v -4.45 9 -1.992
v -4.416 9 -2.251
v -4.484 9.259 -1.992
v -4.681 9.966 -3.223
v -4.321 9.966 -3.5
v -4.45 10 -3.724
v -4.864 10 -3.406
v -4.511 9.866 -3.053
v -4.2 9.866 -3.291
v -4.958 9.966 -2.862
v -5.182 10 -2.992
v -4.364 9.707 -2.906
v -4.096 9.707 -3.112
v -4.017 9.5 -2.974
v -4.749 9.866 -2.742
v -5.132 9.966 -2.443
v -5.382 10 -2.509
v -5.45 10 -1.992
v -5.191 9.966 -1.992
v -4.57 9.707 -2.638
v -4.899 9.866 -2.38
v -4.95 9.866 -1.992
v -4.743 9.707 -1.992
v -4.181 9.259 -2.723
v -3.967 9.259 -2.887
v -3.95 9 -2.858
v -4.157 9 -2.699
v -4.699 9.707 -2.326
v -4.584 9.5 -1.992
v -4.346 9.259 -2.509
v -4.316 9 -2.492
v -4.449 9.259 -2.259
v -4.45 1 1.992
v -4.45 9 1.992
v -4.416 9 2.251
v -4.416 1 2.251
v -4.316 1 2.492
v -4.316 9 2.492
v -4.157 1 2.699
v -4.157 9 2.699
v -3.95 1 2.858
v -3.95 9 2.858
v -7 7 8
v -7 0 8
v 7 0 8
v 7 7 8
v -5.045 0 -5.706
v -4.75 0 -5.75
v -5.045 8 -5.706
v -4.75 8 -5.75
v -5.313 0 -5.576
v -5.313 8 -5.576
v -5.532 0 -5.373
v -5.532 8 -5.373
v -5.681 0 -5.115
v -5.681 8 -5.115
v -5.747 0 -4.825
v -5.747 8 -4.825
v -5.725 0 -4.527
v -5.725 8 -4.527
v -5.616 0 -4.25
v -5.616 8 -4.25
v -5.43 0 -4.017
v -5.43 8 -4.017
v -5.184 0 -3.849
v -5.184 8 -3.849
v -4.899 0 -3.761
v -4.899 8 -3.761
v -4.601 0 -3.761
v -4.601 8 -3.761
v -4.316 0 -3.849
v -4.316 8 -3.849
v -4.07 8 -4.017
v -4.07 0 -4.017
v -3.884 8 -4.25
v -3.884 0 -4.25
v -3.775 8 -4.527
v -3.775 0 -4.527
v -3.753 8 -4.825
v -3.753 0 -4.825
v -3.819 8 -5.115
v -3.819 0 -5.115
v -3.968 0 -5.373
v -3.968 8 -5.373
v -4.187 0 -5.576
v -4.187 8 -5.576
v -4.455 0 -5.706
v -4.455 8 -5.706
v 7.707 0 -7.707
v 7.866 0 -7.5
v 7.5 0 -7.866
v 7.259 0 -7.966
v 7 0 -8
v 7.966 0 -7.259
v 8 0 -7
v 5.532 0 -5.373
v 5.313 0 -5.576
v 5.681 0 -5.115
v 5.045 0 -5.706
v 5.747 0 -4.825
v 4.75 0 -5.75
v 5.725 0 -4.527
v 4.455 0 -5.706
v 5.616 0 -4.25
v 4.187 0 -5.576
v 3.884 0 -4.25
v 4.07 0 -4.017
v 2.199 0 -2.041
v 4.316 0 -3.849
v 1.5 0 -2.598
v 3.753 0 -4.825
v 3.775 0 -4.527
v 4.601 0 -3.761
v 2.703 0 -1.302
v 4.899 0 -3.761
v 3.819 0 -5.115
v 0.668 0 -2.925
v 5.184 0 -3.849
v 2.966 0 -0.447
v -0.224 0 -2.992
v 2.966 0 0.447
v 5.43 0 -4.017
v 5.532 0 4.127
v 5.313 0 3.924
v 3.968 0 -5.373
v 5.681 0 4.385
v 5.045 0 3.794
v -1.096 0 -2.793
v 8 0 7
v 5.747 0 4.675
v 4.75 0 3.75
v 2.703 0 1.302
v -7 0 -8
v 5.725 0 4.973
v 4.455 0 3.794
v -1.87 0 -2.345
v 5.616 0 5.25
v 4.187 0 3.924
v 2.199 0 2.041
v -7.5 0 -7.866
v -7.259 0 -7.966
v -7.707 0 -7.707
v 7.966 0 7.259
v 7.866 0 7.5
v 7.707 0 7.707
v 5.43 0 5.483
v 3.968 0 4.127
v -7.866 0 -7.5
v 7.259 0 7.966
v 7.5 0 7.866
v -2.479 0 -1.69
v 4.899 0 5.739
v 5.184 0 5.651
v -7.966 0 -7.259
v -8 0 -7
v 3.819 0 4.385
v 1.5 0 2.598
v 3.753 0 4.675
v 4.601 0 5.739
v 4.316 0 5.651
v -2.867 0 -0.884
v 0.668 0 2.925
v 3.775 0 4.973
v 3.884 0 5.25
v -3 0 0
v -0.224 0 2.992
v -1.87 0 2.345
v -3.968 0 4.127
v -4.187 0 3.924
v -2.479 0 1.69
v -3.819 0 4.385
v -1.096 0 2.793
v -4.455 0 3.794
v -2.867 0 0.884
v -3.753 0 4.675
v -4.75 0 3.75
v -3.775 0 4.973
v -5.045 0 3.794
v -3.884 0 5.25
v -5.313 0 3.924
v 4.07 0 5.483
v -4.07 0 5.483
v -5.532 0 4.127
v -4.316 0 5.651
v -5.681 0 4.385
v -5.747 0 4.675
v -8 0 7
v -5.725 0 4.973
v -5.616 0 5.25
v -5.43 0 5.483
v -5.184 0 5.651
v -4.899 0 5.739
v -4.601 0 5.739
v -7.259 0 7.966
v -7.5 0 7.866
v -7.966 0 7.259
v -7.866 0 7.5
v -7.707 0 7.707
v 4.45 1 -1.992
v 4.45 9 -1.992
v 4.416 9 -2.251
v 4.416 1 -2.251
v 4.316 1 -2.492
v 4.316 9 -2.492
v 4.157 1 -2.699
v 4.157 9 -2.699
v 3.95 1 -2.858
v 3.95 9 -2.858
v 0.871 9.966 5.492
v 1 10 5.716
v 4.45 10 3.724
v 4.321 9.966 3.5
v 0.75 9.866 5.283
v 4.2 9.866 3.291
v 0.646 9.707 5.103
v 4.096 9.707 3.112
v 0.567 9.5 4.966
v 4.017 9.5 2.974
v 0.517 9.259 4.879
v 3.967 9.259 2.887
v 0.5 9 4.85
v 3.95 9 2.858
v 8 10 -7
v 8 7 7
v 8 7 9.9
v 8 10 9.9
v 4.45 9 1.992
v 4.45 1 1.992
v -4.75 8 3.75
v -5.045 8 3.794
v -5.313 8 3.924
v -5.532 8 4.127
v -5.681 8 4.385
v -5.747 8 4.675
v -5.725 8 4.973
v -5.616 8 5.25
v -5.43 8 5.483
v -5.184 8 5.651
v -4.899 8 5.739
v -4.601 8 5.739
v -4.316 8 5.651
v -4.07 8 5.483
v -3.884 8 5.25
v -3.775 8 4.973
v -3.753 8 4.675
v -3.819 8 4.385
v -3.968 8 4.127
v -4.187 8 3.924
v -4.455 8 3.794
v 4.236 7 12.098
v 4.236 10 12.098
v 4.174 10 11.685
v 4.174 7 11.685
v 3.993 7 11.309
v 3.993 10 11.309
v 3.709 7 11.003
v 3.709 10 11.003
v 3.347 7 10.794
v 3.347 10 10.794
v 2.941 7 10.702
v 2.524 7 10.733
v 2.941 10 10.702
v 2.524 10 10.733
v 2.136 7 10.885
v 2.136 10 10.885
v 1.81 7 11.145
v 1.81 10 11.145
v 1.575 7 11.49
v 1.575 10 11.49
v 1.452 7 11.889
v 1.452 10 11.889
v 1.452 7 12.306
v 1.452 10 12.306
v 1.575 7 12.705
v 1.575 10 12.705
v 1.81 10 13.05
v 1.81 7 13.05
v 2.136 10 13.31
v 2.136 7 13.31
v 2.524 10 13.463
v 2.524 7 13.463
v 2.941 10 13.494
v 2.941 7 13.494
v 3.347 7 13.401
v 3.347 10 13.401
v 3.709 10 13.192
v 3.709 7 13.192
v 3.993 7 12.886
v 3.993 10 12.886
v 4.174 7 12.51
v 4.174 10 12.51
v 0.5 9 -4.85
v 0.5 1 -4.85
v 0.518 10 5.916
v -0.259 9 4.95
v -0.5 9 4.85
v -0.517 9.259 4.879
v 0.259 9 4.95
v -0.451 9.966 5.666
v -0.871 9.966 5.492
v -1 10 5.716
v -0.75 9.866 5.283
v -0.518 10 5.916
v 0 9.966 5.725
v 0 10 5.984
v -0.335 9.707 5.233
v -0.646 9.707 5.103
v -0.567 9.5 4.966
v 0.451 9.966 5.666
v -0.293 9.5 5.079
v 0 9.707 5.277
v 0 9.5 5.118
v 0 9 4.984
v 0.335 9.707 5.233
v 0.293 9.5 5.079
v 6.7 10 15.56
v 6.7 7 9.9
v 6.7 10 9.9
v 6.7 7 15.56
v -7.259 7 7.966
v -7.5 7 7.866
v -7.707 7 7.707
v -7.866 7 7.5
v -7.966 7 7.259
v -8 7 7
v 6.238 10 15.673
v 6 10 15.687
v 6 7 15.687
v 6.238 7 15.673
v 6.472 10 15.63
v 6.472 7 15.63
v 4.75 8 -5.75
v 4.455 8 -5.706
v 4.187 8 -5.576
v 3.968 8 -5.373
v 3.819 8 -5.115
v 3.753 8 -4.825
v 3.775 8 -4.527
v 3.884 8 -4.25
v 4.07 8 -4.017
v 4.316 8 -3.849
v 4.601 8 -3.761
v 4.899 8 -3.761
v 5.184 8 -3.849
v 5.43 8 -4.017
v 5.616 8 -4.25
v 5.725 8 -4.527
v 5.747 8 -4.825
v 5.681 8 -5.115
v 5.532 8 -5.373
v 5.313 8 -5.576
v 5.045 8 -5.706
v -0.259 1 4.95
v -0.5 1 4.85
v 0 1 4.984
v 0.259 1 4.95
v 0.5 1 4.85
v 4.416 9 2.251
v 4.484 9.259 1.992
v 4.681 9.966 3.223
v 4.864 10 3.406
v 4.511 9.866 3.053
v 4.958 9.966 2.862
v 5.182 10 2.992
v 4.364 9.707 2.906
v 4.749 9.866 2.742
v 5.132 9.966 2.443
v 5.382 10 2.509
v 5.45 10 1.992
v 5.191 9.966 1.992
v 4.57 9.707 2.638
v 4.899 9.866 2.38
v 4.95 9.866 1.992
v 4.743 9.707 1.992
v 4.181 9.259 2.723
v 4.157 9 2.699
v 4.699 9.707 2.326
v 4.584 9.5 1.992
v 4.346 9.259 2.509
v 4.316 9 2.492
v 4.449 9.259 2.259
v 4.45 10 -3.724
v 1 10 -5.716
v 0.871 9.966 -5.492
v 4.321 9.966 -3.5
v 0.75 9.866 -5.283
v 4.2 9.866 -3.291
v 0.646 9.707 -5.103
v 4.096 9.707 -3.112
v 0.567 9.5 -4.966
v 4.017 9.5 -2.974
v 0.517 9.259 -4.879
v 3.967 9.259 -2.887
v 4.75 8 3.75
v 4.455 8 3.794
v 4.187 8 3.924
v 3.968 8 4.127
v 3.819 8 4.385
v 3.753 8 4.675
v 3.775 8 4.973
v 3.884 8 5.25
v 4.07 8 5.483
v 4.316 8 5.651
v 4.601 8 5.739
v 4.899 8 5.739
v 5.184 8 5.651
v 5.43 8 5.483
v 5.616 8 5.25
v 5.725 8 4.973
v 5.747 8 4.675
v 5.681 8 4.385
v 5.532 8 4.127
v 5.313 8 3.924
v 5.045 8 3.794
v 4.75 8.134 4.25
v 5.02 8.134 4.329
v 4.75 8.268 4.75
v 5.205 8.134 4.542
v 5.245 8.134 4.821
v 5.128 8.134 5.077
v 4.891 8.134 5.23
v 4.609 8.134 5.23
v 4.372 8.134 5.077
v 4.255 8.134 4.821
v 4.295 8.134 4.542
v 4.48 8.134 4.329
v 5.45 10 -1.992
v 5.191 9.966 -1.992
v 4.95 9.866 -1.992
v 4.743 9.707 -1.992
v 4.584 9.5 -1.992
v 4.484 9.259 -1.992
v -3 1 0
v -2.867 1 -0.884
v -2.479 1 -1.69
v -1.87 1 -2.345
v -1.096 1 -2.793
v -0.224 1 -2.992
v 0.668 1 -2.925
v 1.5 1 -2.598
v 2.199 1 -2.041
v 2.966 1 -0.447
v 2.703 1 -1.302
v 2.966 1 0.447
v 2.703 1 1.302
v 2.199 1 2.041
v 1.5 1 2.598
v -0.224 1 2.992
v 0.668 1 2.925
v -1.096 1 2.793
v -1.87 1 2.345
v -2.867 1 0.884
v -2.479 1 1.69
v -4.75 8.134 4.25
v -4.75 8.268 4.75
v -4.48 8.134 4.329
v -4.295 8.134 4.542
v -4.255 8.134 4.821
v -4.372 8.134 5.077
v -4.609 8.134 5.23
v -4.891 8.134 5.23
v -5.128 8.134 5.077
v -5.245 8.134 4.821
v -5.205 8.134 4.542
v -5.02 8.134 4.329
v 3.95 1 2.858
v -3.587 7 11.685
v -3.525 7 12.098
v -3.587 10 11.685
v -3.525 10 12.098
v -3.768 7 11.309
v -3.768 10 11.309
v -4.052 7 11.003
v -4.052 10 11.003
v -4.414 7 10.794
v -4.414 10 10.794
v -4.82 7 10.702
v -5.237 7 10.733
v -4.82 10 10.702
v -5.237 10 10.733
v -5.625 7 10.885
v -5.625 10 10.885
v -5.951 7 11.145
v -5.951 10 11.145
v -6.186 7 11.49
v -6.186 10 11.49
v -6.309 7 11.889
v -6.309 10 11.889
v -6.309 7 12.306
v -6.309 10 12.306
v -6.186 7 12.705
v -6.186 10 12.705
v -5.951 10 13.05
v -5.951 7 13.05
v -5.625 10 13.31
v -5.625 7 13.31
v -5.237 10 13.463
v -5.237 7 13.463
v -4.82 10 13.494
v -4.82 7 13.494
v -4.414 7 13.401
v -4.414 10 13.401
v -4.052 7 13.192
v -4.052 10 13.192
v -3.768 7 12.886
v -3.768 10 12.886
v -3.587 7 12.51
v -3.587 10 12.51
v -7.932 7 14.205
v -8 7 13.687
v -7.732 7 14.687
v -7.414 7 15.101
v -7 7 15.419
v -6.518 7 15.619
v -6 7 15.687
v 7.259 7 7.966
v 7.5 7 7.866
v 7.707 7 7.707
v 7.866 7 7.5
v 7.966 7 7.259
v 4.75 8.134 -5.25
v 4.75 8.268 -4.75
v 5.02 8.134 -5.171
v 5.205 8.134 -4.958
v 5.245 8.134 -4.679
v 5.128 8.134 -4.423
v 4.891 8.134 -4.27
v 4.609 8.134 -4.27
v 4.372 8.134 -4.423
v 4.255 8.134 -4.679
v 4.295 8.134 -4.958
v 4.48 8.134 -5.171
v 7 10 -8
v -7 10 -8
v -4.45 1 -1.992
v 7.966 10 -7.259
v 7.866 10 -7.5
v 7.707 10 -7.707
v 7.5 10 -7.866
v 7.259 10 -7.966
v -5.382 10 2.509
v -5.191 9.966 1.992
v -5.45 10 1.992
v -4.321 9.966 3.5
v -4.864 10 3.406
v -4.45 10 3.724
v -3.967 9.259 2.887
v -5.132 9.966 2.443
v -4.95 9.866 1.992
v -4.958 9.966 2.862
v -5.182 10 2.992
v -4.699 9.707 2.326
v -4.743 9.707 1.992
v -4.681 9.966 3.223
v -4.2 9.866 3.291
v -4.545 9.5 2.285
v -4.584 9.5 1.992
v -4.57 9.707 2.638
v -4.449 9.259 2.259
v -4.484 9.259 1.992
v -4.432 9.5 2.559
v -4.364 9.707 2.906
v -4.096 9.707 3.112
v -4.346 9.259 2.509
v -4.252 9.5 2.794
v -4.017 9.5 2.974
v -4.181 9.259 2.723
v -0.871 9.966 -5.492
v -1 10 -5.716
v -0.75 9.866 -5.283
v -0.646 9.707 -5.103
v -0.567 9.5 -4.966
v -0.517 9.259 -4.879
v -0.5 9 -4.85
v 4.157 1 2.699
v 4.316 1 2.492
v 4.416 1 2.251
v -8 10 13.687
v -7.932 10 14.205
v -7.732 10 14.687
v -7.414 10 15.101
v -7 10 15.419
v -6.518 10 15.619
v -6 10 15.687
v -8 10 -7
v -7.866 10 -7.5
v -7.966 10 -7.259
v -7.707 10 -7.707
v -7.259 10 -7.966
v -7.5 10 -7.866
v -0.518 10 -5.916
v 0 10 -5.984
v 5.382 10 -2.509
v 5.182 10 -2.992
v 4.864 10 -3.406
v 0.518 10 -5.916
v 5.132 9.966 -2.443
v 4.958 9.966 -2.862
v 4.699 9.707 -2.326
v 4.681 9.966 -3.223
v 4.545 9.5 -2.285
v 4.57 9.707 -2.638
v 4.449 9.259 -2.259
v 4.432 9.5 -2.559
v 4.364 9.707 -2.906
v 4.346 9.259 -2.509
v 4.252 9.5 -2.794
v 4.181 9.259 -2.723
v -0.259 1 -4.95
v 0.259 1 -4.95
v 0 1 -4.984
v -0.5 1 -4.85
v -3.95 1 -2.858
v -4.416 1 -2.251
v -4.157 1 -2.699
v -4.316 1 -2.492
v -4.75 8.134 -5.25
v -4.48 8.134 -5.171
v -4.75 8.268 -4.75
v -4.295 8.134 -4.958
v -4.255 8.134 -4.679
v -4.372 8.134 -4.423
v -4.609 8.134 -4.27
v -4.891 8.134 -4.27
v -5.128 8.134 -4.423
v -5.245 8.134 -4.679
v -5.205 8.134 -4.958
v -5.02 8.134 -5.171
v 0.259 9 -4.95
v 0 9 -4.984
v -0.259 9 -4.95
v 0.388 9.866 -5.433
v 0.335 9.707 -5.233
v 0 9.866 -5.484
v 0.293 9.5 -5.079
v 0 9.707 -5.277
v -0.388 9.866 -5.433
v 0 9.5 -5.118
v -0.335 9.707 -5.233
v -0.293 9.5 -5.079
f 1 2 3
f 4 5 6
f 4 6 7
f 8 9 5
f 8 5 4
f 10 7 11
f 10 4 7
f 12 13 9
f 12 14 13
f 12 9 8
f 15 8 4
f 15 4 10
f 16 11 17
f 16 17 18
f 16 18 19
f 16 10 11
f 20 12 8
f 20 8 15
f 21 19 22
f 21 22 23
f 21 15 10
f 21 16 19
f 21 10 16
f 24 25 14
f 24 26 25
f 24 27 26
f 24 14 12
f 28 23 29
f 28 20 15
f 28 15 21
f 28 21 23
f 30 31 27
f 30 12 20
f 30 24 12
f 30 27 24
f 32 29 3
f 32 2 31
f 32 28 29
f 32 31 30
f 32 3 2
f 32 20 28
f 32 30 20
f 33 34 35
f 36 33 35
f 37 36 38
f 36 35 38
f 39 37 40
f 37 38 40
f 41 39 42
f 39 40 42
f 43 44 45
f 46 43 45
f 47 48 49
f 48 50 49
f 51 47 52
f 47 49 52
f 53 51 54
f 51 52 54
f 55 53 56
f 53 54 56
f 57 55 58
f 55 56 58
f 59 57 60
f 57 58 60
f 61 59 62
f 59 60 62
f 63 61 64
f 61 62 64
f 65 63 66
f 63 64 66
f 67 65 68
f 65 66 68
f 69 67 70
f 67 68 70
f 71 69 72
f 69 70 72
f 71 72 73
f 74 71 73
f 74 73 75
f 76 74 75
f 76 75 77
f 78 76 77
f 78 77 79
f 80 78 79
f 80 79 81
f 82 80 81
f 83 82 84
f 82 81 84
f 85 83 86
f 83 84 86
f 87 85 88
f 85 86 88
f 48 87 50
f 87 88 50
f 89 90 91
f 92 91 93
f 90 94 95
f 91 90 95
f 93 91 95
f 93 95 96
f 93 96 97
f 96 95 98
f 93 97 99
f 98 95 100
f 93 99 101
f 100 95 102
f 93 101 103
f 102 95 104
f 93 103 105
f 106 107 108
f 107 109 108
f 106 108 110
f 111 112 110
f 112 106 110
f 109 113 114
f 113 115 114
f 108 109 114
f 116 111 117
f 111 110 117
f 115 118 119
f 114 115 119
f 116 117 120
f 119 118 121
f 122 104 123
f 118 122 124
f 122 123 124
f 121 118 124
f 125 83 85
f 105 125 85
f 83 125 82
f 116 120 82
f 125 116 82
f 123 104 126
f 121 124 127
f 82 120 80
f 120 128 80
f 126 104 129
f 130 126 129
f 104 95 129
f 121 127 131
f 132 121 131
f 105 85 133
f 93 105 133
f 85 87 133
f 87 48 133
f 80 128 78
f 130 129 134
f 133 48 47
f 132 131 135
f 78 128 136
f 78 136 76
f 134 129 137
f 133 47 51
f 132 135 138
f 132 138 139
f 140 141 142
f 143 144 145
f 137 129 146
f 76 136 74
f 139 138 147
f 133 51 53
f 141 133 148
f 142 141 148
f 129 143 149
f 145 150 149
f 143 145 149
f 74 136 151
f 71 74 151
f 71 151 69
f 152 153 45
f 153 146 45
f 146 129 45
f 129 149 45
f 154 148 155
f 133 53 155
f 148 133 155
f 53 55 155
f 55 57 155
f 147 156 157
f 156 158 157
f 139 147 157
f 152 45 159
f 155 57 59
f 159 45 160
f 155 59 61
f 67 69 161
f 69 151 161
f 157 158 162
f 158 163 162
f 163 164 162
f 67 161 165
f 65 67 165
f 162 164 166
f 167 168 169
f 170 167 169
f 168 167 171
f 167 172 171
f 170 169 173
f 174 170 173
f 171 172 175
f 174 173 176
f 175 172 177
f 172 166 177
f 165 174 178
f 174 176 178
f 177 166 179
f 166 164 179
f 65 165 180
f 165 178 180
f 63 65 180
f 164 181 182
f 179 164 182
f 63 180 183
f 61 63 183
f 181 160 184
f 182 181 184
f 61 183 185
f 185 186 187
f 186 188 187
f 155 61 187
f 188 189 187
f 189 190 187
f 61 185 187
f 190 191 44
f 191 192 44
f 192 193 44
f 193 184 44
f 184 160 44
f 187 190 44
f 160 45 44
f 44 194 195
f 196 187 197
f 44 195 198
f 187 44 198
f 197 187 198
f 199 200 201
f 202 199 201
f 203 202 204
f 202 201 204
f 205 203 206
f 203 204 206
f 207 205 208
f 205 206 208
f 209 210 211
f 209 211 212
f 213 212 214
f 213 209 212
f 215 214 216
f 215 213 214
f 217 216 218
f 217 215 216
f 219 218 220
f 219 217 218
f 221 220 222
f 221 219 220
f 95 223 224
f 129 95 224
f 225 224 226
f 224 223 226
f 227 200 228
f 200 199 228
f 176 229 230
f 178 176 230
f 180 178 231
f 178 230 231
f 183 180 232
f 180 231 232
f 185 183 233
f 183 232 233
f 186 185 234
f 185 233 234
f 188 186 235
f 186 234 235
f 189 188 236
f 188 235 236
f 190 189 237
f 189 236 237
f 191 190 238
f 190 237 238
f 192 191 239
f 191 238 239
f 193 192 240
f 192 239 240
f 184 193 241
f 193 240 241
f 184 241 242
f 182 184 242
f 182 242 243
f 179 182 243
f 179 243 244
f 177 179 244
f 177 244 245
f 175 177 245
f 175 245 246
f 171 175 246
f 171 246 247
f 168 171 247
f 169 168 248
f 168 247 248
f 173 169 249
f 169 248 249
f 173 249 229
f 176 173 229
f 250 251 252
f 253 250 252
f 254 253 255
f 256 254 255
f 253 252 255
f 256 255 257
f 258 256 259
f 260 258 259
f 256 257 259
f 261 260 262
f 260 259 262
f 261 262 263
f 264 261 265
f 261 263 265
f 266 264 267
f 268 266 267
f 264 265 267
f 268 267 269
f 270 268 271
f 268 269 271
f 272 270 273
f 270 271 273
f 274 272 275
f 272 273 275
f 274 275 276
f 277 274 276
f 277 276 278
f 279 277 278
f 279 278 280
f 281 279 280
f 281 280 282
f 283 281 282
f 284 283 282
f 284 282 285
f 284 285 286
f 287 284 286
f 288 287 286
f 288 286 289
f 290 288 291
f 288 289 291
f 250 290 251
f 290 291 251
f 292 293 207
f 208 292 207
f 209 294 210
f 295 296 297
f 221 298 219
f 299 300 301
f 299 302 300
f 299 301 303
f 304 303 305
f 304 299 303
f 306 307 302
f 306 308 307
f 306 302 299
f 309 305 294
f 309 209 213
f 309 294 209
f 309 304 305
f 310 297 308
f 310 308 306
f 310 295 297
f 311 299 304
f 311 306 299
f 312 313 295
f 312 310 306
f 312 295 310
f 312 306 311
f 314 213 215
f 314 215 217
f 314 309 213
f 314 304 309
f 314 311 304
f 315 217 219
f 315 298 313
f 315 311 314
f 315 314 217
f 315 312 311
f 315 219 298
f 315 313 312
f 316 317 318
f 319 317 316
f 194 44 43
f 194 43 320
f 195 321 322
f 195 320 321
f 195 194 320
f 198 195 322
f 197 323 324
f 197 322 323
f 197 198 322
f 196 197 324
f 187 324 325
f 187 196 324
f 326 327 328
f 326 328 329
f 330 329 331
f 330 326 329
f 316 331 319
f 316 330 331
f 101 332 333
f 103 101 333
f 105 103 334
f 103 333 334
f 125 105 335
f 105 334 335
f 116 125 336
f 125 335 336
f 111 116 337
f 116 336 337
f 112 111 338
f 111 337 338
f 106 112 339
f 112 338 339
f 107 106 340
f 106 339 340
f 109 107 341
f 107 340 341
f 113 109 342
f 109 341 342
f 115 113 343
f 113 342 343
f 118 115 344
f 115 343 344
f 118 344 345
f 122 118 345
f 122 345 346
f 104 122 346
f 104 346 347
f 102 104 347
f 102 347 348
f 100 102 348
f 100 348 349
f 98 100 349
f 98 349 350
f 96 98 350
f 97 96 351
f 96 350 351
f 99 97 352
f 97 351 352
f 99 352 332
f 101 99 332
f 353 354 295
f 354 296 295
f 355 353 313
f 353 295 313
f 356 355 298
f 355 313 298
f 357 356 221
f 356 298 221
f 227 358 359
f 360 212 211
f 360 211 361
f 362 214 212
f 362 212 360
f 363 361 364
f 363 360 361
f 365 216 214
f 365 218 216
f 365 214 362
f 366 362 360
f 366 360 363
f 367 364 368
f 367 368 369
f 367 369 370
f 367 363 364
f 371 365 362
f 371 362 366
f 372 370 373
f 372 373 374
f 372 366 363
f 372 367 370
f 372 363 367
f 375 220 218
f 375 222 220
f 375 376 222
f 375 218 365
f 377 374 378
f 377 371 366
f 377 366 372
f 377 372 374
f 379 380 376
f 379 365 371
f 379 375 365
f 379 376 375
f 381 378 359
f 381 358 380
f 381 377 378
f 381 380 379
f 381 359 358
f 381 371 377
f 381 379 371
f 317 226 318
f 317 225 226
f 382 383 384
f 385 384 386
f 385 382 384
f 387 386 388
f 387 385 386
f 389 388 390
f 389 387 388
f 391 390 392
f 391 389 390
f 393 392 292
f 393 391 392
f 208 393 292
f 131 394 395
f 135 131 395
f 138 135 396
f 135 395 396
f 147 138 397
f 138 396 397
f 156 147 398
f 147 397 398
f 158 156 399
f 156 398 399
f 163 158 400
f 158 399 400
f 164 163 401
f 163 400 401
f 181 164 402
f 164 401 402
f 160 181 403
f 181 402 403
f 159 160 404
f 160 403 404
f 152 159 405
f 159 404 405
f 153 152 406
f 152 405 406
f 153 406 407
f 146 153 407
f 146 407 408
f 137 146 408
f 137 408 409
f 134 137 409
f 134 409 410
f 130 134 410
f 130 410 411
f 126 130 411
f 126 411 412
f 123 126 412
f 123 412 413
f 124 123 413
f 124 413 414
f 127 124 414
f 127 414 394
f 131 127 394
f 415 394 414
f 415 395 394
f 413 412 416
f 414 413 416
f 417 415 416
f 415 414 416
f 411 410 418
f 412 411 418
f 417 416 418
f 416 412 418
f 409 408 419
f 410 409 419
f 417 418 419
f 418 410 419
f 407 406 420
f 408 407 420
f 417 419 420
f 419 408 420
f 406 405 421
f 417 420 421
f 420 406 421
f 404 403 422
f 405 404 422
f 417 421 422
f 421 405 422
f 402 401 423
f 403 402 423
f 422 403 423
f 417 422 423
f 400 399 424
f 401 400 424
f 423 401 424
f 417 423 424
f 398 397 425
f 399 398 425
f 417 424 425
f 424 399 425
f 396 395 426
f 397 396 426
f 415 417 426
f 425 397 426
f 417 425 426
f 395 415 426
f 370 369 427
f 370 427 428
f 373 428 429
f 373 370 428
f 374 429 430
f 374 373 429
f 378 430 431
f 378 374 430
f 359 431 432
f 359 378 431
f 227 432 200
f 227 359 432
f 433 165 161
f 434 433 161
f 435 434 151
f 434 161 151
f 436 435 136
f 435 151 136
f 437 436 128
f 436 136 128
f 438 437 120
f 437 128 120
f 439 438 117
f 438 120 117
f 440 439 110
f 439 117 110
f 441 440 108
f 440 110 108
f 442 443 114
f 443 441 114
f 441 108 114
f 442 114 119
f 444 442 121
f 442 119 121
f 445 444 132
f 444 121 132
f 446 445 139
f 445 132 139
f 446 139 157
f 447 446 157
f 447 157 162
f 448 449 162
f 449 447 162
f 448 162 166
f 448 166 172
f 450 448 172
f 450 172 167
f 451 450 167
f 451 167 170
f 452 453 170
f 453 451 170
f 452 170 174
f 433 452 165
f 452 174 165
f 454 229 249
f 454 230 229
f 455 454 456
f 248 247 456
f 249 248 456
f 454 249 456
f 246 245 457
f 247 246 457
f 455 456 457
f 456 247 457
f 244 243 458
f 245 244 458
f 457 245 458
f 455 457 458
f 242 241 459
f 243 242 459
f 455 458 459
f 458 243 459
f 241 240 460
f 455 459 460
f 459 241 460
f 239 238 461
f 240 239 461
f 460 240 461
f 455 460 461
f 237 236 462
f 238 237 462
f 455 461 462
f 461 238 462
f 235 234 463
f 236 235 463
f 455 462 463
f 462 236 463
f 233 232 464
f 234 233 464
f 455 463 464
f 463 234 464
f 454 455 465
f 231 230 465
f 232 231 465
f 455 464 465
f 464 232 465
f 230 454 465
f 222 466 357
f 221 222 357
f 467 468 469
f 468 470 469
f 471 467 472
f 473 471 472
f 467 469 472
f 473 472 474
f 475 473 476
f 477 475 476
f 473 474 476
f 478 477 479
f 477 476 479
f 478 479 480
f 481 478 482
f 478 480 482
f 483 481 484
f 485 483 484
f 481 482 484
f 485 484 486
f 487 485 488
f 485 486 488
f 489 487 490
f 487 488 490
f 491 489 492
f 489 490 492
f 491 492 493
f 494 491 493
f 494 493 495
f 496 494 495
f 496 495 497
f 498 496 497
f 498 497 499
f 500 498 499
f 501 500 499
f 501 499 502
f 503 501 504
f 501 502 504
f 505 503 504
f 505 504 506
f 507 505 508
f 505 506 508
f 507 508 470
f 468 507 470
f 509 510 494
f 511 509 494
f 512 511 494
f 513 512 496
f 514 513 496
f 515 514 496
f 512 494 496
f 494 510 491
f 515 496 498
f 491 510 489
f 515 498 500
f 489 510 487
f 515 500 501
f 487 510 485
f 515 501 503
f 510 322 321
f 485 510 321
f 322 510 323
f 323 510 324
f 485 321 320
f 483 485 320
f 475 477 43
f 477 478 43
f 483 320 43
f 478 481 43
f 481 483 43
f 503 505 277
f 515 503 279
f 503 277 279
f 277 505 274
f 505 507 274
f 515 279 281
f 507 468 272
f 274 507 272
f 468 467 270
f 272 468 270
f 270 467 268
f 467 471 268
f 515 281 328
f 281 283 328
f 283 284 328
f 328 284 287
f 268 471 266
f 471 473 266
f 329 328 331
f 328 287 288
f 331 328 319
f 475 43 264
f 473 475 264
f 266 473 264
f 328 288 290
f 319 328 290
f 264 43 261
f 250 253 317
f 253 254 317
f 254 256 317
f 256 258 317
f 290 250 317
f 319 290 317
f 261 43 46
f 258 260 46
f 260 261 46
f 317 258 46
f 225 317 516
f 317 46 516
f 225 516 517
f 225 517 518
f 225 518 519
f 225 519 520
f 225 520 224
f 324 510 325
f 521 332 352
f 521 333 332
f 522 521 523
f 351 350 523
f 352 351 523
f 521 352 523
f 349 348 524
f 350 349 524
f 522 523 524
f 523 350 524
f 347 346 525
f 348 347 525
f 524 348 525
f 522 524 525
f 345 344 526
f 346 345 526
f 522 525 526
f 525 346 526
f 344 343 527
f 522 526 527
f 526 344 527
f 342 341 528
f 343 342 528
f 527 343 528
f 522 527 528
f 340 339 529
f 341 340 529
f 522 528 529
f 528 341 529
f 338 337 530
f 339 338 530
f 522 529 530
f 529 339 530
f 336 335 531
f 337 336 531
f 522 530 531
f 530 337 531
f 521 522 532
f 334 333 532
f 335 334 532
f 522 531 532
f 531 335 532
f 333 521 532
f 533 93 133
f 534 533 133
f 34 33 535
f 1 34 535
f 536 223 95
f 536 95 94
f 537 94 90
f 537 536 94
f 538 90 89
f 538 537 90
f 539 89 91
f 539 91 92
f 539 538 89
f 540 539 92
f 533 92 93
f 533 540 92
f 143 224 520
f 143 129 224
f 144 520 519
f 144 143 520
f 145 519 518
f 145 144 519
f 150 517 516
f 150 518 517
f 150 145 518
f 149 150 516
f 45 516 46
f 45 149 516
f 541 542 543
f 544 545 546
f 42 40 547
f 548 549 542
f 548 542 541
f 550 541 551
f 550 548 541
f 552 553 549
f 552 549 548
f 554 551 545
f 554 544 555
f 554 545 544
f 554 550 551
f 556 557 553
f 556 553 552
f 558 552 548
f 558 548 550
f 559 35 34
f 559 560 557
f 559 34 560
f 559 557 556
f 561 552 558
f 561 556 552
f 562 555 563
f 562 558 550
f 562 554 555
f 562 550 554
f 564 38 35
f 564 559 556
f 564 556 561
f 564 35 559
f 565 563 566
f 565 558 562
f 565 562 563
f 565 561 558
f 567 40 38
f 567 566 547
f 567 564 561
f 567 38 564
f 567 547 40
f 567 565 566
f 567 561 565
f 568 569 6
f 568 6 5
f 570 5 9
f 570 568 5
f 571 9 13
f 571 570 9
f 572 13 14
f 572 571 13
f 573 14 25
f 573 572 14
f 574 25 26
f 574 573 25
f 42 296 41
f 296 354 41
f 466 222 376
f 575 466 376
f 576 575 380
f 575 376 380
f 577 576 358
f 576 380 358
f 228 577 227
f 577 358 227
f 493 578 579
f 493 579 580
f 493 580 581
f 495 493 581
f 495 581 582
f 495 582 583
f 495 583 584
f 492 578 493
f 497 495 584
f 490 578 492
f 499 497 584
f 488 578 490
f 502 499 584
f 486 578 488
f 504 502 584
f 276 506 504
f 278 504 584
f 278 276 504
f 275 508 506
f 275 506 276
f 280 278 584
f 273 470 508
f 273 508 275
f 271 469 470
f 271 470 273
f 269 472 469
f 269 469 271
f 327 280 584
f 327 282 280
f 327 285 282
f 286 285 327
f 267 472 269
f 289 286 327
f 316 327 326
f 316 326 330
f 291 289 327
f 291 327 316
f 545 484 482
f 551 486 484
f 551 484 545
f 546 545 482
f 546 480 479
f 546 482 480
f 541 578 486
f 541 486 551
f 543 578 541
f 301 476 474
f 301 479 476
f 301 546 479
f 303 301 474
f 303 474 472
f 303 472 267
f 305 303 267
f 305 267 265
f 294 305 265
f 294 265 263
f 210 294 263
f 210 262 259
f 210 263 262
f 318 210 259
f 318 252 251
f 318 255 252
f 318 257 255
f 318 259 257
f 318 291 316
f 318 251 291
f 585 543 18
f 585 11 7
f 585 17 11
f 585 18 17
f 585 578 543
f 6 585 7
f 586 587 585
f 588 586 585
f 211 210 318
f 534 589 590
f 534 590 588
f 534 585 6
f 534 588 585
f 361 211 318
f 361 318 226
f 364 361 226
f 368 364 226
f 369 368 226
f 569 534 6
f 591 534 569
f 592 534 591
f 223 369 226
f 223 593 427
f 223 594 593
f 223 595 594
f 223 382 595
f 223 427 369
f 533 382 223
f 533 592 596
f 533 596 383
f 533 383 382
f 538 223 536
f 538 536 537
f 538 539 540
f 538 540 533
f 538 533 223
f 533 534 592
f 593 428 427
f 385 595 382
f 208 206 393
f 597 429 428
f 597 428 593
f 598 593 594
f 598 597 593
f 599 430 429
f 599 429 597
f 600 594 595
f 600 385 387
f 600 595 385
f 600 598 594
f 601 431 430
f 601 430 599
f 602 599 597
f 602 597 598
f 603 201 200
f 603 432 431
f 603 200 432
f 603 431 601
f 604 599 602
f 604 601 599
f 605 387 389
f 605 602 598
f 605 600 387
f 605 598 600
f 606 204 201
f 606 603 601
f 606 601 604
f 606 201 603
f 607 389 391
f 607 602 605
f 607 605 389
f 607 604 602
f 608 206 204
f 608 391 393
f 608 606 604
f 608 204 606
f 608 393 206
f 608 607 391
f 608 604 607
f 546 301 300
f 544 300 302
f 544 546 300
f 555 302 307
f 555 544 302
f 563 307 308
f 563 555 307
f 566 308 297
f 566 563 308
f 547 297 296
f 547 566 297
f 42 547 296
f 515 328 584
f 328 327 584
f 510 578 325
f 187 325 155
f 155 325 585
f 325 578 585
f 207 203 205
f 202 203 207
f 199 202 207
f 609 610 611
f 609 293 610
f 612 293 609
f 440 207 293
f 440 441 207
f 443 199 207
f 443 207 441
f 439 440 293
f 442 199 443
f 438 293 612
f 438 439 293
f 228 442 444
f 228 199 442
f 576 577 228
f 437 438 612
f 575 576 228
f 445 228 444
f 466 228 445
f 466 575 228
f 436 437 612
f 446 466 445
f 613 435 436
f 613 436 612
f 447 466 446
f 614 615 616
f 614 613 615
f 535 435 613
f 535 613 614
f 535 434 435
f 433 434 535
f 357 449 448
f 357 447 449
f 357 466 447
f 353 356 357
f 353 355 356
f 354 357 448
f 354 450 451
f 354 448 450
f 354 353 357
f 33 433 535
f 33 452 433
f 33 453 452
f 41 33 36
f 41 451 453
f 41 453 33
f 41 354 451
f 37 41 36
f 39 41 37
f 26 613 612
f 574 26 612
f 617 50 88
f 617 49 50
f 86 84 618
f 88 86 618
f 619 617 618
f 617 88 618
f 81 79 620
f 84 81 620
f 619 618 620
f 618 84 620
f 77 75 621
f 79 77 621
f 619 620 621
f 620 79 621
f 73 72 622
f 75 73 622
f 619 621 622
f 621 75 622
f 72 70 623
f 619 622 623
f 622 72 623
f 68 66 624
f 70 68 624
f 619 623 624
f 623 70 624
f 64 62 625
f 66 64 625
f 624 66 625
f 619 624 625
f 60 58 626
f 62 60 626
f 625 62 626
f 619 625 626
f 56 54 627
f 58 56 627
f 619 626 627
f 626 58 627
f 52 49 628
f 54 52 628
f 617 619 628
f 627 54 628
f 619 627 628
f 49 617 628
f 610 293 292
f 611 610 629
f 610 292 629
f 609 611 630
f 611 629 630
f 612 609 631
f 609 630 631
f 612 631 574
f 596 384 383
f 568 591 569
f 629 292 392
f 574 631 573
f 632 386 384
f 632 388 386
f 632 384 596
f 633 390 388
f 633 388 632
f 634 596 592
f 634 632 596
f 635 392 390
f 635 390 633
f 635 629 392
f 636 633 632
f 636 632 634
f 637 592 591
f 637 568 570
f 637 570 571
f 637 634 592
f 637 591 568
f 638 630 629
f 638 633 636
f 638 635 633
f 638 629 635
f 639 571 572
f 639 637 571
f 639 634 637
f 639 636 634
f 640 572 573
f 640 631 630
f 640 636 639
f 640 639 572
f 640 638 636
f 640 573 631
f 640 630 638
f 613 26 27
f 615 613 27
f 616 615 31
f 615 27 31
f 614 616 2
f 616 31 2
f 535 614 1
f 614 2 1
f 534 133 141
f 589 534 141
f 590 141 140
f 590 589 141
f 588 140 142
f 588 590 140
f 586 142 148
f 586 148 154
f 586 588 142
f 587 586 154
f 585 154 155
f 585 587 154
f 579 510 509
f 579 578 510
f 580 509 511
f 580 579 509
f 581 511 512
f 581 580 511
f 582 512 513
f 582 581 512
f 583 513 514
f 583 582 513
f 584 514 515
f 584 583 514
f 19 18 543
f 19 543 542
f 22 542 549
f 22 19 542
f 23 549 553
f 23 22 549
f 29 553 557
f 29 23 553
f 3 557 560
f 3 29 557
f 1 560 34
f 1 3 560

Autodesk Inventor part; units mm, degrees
ref_plane "YZ Plane" through (0, 0, 0) normal (1, 0, 0) x (0, 1, 0)
ref_plane "XZ Plane" through (0, 0, 0) normal (0, 1, 0) x (-1, 0, 0)
ref_plane "XY Plane" through (0, 0, 0) normal (0, 0, 1) x (1, 0, 0)
sketch "Skizze1" plane through (0, 0, 0) normal (0, 1, 0) x (-1, 0, 0)
  line L0 (-8, -8) -> (8, -8)
  line L1 (8, -8) -> (8, 8)
  line L2 (8, 8) -> (-8, 8)
  line L3 (-8, 8) -> (-8, -8)
  line L4 (-8, -8) -> (8, 8) construction
  line L5 (8, -8) -> (-8, 8) construction
  circle A0 centre (0, 0) radius 3
  line L6 (4.75, -4.75) -> (-4.75, -4.75) construction
  line L7 (-4.75, -4.75) -> (-4.75, 4.75) construction
  line L8 (-4.75, 4.75) -> (4.75, 4.75) construction
  line L9 (4.75, 4.75) -> (4.75, -4.75) construction
  line L10 (4.75, -4.75) -> (-4.75, 4.75) construction
  line L11 (-4.75, -4.75) -> (4.75, 4.75) construction
  circle A1 centre (-4.75, 4.75) radius 0.9
  circle A2 centre (-4.75, -4.75) radius 0.9
  circle A3 centre (4.75, -4.75) radius 0.9
  circle A4 centre (4.75, 4.75) radius 0.9
  dimension "d0" = 16
  dimension "d1" = 16
  dimension "d21" = 6
  dimension "d22" = 9.5
  dimension "d23" = 9.5
  dimension "d24" = 1.8
  dimension "d25" = 1.8
  dimension "d26" = 1.8
  dimension "d27" = 1.8
extrude "Extrusion1" add sketch "Skizze1" along normal blind 1
sketch "Skizze2" plane through (0, 1, 0) normal (0, 1, 0) x (1, 0, 0)
  line L0 (-8, 8) -> (-8, -8) projected
  line L1 (-8, -8) -> (8, -8) projected
  line L2 (8, -8) -> (8, 8) projected
  line L3 (8, 8) -> (-8, 8) projected
  line L4 (0, -5.1384) -> (-4.45, -2.5692)
  line L5 (-4.45, -2.5692) -> (-4.45, 2.5692)
  line L6 (-4.45, 2.5692) -> (0, 5.1384)
  line L7 (0, 5.1384) -> (4.45, 2.5692)
  line L8 (4.45, 2.5692) -> (4.45, -2.5692)
  line L9 (4.45, -2.5692) -> (0, -5.1384)
  line L10 (-8, 8) -> (-8, -8) projected
  line L11 (8, 8) -> (-8, 8) projected
  line L12 (8, -8) -> (8, 8) projected
  line L13 (-8, -8) -> (8, -8) projected
  circle A0 centre (0, 0) radius 3 projected
  circle A1 centre (4.75, -4.75) radius 0.9 projected
  circle A2 centre (4.75, 4.75) radius 0.9 projected
  circle A3 centre (-4.75, 4.75) radius 0.9 projected
  circle A4 centre (-4.75, -4.75) radius 0.9 projected
  point P0 (8, 5.7735)
  point P1 (8, -5.7735)
  point P2 (-8, -5.7735)
  point P3 (-8, 5.7735)
  point P4 (4.1436, -8)
  point P5 (-4.1436, -8)
  point P6 (4.1436, 8)
  point P7 (-4.1436, 8)
  point P8 (-5.0758, 3.9111)
  point P9 (-3.8605, 4.6127)
  point P10 (3.8605, 4.6127)
  point P11 (5.0758, 3.9111)
  point P12 (5.0758, -3.9111)
  point P13 (3.8605, -4.6127)
  point P14 (-3.8605, -4.6127)
  point P15 (-5.0758, -3.9111)
  dimension "d6" = 8.9
extrude "Extrusion2" add sketch "Skizze2" along normal blind 9 contours L3 L2 L1 L0 | A1 | A2 | A3 | A4
fillet "Rundung2" radius 1 16 edges at (0, 5.5, 5.1384) (-4.45, 5.5, 2.5692) (-4.45, 5.5, -2.5692) (0, 5.5, -5.1384) (4.45, 5.5, -2.5692) (4.45, 5.5, 2.5692) (8, 5, -8) (-8, 5, -8) (-8, 5, 8) (8, 5, 8) (-2.225, 10, -3.8538) (-4.45, 10, 0) (-2.225, 10, 3.8538) (2.225, 10, 3.8538) (4.45, 10, 0) (2.225, 10, -3.8538)
sketch "Skizze3" plane through (0, 10, 0) normal (0, 1, 0) x (1, 0, 0)
  arc A0 (7, -8) -> (8, -7) centre (7, -7) ccw projected
  line L0 (8, -7) -> (8, 7) projected
  arc A1 (8, 7) -> (7, 8) centre (7, 7) ccw projected
  line L1 (7, 8) -> (-7, 8) projected
  arc A2 (-7, 8) -> (-8, 7) centre (-7, 7) ccw projected
  line L2 (-8, 7) -> (-8, -7) projected
  arc A3 (-8, -7) -> (-7, -8) centre (-7, -7) ccw projected
  line L3 (-7, -8) -> (7, -8) projected
  line L4 (-8, -5.6869) -> (8, -5.6869)
  line L5 (8, -5.6869) -> (8, -13.6869)
  line L6 (6, -15.6869) -> (-6, -15.6869)
  line L7 (-8, -13.6869) -> (-8, -5.6869)
  circle A4 centre (-4.925, -12.0977) radius 1.4
  circle A5 centre (2.836, -12.0977) radius 1.4
  arc A6 (-8, -13.6869) -> (-6, -15.6869) centre (-6, -13.6869) ccw
  arc A7 (6, -15.6869) -> (8, -13.6869) centre (6, -13.6869) ccw
  point P0 (0, 0)
  point P1 (8, -15.6869)
  point P2 (8, -7)
  dimension "d10" = 10
  dimension "d11" = 2.8
  dimension "d12" = 2.8
  dimension "d13" = 2
extrude "Extrusion3" add sketch "Skizze3" against normal blind 3 contours A0 L5 A7 L6 A6 L7 A3 L3
sketch "Skizze4" plane through (0, 0, 0) normal (0, -1, 0) x (1, 0, 0)
  line L0 (12.8, 30) -> (12.8, 10) projected
  line L1 (12.8, 30) -> (6.8, 30) projected
  line L2 (6.8, 10) -> (6.8, 30) projected
  line L3 (12.8, 10) -> (6.8, 10) projected
  line L4 (6.7, 30.1) -> (12.9, 30.1)
  line L5 (12.9, 30.1) -> (12.9, 9.9)
  line L6 (12.9, 9.9) -> (6.7, 9.9)
  line L7 (6.7, 9.9) -> (6.7, 30.1)
  point P0 (0, 0)
  dimension "d16" = 0.1
extrude "Extrusion4" cut sketch "Skizze4" against normal through all contours L0 L3 L2 L1 | L4 L5 L6 L7
sketch "Skizze5" plane through (0, 0, 0) normal (0, -1, 0) x (1, 0, 0)
  line L0 (-4.75, -4.75) -> (4.75, -4.75)
  line L1 (4.75, -4.75) -> (4.75, 4.75)
  line L2 (4.75, 4.75) -> (-4.75, 4.75)
  line L3 (-4.75, 4.75) -> (-4.75, -4.75)
  line L4 (-4.75, -4.75) -> (4.75, 4.75) construction
  line L5 (4.75, -4.75) -> (-4.75, 4.75) construction
  point P0 (0, 0)
  dimension "d19" = 9.5
  dimension "d20" = 9.5
hole "Bohrung1" at (4.75, 0, 4.75) at (-4.75, 0, 4.75) at (4.75, 0, -4.75) at (-4.75, 0, -4.75) direction (0, 1, 0) diameter 2 depth 8 tip angle 150
properties part number "30_Laser_to_M12Adapter_9,5mm"
